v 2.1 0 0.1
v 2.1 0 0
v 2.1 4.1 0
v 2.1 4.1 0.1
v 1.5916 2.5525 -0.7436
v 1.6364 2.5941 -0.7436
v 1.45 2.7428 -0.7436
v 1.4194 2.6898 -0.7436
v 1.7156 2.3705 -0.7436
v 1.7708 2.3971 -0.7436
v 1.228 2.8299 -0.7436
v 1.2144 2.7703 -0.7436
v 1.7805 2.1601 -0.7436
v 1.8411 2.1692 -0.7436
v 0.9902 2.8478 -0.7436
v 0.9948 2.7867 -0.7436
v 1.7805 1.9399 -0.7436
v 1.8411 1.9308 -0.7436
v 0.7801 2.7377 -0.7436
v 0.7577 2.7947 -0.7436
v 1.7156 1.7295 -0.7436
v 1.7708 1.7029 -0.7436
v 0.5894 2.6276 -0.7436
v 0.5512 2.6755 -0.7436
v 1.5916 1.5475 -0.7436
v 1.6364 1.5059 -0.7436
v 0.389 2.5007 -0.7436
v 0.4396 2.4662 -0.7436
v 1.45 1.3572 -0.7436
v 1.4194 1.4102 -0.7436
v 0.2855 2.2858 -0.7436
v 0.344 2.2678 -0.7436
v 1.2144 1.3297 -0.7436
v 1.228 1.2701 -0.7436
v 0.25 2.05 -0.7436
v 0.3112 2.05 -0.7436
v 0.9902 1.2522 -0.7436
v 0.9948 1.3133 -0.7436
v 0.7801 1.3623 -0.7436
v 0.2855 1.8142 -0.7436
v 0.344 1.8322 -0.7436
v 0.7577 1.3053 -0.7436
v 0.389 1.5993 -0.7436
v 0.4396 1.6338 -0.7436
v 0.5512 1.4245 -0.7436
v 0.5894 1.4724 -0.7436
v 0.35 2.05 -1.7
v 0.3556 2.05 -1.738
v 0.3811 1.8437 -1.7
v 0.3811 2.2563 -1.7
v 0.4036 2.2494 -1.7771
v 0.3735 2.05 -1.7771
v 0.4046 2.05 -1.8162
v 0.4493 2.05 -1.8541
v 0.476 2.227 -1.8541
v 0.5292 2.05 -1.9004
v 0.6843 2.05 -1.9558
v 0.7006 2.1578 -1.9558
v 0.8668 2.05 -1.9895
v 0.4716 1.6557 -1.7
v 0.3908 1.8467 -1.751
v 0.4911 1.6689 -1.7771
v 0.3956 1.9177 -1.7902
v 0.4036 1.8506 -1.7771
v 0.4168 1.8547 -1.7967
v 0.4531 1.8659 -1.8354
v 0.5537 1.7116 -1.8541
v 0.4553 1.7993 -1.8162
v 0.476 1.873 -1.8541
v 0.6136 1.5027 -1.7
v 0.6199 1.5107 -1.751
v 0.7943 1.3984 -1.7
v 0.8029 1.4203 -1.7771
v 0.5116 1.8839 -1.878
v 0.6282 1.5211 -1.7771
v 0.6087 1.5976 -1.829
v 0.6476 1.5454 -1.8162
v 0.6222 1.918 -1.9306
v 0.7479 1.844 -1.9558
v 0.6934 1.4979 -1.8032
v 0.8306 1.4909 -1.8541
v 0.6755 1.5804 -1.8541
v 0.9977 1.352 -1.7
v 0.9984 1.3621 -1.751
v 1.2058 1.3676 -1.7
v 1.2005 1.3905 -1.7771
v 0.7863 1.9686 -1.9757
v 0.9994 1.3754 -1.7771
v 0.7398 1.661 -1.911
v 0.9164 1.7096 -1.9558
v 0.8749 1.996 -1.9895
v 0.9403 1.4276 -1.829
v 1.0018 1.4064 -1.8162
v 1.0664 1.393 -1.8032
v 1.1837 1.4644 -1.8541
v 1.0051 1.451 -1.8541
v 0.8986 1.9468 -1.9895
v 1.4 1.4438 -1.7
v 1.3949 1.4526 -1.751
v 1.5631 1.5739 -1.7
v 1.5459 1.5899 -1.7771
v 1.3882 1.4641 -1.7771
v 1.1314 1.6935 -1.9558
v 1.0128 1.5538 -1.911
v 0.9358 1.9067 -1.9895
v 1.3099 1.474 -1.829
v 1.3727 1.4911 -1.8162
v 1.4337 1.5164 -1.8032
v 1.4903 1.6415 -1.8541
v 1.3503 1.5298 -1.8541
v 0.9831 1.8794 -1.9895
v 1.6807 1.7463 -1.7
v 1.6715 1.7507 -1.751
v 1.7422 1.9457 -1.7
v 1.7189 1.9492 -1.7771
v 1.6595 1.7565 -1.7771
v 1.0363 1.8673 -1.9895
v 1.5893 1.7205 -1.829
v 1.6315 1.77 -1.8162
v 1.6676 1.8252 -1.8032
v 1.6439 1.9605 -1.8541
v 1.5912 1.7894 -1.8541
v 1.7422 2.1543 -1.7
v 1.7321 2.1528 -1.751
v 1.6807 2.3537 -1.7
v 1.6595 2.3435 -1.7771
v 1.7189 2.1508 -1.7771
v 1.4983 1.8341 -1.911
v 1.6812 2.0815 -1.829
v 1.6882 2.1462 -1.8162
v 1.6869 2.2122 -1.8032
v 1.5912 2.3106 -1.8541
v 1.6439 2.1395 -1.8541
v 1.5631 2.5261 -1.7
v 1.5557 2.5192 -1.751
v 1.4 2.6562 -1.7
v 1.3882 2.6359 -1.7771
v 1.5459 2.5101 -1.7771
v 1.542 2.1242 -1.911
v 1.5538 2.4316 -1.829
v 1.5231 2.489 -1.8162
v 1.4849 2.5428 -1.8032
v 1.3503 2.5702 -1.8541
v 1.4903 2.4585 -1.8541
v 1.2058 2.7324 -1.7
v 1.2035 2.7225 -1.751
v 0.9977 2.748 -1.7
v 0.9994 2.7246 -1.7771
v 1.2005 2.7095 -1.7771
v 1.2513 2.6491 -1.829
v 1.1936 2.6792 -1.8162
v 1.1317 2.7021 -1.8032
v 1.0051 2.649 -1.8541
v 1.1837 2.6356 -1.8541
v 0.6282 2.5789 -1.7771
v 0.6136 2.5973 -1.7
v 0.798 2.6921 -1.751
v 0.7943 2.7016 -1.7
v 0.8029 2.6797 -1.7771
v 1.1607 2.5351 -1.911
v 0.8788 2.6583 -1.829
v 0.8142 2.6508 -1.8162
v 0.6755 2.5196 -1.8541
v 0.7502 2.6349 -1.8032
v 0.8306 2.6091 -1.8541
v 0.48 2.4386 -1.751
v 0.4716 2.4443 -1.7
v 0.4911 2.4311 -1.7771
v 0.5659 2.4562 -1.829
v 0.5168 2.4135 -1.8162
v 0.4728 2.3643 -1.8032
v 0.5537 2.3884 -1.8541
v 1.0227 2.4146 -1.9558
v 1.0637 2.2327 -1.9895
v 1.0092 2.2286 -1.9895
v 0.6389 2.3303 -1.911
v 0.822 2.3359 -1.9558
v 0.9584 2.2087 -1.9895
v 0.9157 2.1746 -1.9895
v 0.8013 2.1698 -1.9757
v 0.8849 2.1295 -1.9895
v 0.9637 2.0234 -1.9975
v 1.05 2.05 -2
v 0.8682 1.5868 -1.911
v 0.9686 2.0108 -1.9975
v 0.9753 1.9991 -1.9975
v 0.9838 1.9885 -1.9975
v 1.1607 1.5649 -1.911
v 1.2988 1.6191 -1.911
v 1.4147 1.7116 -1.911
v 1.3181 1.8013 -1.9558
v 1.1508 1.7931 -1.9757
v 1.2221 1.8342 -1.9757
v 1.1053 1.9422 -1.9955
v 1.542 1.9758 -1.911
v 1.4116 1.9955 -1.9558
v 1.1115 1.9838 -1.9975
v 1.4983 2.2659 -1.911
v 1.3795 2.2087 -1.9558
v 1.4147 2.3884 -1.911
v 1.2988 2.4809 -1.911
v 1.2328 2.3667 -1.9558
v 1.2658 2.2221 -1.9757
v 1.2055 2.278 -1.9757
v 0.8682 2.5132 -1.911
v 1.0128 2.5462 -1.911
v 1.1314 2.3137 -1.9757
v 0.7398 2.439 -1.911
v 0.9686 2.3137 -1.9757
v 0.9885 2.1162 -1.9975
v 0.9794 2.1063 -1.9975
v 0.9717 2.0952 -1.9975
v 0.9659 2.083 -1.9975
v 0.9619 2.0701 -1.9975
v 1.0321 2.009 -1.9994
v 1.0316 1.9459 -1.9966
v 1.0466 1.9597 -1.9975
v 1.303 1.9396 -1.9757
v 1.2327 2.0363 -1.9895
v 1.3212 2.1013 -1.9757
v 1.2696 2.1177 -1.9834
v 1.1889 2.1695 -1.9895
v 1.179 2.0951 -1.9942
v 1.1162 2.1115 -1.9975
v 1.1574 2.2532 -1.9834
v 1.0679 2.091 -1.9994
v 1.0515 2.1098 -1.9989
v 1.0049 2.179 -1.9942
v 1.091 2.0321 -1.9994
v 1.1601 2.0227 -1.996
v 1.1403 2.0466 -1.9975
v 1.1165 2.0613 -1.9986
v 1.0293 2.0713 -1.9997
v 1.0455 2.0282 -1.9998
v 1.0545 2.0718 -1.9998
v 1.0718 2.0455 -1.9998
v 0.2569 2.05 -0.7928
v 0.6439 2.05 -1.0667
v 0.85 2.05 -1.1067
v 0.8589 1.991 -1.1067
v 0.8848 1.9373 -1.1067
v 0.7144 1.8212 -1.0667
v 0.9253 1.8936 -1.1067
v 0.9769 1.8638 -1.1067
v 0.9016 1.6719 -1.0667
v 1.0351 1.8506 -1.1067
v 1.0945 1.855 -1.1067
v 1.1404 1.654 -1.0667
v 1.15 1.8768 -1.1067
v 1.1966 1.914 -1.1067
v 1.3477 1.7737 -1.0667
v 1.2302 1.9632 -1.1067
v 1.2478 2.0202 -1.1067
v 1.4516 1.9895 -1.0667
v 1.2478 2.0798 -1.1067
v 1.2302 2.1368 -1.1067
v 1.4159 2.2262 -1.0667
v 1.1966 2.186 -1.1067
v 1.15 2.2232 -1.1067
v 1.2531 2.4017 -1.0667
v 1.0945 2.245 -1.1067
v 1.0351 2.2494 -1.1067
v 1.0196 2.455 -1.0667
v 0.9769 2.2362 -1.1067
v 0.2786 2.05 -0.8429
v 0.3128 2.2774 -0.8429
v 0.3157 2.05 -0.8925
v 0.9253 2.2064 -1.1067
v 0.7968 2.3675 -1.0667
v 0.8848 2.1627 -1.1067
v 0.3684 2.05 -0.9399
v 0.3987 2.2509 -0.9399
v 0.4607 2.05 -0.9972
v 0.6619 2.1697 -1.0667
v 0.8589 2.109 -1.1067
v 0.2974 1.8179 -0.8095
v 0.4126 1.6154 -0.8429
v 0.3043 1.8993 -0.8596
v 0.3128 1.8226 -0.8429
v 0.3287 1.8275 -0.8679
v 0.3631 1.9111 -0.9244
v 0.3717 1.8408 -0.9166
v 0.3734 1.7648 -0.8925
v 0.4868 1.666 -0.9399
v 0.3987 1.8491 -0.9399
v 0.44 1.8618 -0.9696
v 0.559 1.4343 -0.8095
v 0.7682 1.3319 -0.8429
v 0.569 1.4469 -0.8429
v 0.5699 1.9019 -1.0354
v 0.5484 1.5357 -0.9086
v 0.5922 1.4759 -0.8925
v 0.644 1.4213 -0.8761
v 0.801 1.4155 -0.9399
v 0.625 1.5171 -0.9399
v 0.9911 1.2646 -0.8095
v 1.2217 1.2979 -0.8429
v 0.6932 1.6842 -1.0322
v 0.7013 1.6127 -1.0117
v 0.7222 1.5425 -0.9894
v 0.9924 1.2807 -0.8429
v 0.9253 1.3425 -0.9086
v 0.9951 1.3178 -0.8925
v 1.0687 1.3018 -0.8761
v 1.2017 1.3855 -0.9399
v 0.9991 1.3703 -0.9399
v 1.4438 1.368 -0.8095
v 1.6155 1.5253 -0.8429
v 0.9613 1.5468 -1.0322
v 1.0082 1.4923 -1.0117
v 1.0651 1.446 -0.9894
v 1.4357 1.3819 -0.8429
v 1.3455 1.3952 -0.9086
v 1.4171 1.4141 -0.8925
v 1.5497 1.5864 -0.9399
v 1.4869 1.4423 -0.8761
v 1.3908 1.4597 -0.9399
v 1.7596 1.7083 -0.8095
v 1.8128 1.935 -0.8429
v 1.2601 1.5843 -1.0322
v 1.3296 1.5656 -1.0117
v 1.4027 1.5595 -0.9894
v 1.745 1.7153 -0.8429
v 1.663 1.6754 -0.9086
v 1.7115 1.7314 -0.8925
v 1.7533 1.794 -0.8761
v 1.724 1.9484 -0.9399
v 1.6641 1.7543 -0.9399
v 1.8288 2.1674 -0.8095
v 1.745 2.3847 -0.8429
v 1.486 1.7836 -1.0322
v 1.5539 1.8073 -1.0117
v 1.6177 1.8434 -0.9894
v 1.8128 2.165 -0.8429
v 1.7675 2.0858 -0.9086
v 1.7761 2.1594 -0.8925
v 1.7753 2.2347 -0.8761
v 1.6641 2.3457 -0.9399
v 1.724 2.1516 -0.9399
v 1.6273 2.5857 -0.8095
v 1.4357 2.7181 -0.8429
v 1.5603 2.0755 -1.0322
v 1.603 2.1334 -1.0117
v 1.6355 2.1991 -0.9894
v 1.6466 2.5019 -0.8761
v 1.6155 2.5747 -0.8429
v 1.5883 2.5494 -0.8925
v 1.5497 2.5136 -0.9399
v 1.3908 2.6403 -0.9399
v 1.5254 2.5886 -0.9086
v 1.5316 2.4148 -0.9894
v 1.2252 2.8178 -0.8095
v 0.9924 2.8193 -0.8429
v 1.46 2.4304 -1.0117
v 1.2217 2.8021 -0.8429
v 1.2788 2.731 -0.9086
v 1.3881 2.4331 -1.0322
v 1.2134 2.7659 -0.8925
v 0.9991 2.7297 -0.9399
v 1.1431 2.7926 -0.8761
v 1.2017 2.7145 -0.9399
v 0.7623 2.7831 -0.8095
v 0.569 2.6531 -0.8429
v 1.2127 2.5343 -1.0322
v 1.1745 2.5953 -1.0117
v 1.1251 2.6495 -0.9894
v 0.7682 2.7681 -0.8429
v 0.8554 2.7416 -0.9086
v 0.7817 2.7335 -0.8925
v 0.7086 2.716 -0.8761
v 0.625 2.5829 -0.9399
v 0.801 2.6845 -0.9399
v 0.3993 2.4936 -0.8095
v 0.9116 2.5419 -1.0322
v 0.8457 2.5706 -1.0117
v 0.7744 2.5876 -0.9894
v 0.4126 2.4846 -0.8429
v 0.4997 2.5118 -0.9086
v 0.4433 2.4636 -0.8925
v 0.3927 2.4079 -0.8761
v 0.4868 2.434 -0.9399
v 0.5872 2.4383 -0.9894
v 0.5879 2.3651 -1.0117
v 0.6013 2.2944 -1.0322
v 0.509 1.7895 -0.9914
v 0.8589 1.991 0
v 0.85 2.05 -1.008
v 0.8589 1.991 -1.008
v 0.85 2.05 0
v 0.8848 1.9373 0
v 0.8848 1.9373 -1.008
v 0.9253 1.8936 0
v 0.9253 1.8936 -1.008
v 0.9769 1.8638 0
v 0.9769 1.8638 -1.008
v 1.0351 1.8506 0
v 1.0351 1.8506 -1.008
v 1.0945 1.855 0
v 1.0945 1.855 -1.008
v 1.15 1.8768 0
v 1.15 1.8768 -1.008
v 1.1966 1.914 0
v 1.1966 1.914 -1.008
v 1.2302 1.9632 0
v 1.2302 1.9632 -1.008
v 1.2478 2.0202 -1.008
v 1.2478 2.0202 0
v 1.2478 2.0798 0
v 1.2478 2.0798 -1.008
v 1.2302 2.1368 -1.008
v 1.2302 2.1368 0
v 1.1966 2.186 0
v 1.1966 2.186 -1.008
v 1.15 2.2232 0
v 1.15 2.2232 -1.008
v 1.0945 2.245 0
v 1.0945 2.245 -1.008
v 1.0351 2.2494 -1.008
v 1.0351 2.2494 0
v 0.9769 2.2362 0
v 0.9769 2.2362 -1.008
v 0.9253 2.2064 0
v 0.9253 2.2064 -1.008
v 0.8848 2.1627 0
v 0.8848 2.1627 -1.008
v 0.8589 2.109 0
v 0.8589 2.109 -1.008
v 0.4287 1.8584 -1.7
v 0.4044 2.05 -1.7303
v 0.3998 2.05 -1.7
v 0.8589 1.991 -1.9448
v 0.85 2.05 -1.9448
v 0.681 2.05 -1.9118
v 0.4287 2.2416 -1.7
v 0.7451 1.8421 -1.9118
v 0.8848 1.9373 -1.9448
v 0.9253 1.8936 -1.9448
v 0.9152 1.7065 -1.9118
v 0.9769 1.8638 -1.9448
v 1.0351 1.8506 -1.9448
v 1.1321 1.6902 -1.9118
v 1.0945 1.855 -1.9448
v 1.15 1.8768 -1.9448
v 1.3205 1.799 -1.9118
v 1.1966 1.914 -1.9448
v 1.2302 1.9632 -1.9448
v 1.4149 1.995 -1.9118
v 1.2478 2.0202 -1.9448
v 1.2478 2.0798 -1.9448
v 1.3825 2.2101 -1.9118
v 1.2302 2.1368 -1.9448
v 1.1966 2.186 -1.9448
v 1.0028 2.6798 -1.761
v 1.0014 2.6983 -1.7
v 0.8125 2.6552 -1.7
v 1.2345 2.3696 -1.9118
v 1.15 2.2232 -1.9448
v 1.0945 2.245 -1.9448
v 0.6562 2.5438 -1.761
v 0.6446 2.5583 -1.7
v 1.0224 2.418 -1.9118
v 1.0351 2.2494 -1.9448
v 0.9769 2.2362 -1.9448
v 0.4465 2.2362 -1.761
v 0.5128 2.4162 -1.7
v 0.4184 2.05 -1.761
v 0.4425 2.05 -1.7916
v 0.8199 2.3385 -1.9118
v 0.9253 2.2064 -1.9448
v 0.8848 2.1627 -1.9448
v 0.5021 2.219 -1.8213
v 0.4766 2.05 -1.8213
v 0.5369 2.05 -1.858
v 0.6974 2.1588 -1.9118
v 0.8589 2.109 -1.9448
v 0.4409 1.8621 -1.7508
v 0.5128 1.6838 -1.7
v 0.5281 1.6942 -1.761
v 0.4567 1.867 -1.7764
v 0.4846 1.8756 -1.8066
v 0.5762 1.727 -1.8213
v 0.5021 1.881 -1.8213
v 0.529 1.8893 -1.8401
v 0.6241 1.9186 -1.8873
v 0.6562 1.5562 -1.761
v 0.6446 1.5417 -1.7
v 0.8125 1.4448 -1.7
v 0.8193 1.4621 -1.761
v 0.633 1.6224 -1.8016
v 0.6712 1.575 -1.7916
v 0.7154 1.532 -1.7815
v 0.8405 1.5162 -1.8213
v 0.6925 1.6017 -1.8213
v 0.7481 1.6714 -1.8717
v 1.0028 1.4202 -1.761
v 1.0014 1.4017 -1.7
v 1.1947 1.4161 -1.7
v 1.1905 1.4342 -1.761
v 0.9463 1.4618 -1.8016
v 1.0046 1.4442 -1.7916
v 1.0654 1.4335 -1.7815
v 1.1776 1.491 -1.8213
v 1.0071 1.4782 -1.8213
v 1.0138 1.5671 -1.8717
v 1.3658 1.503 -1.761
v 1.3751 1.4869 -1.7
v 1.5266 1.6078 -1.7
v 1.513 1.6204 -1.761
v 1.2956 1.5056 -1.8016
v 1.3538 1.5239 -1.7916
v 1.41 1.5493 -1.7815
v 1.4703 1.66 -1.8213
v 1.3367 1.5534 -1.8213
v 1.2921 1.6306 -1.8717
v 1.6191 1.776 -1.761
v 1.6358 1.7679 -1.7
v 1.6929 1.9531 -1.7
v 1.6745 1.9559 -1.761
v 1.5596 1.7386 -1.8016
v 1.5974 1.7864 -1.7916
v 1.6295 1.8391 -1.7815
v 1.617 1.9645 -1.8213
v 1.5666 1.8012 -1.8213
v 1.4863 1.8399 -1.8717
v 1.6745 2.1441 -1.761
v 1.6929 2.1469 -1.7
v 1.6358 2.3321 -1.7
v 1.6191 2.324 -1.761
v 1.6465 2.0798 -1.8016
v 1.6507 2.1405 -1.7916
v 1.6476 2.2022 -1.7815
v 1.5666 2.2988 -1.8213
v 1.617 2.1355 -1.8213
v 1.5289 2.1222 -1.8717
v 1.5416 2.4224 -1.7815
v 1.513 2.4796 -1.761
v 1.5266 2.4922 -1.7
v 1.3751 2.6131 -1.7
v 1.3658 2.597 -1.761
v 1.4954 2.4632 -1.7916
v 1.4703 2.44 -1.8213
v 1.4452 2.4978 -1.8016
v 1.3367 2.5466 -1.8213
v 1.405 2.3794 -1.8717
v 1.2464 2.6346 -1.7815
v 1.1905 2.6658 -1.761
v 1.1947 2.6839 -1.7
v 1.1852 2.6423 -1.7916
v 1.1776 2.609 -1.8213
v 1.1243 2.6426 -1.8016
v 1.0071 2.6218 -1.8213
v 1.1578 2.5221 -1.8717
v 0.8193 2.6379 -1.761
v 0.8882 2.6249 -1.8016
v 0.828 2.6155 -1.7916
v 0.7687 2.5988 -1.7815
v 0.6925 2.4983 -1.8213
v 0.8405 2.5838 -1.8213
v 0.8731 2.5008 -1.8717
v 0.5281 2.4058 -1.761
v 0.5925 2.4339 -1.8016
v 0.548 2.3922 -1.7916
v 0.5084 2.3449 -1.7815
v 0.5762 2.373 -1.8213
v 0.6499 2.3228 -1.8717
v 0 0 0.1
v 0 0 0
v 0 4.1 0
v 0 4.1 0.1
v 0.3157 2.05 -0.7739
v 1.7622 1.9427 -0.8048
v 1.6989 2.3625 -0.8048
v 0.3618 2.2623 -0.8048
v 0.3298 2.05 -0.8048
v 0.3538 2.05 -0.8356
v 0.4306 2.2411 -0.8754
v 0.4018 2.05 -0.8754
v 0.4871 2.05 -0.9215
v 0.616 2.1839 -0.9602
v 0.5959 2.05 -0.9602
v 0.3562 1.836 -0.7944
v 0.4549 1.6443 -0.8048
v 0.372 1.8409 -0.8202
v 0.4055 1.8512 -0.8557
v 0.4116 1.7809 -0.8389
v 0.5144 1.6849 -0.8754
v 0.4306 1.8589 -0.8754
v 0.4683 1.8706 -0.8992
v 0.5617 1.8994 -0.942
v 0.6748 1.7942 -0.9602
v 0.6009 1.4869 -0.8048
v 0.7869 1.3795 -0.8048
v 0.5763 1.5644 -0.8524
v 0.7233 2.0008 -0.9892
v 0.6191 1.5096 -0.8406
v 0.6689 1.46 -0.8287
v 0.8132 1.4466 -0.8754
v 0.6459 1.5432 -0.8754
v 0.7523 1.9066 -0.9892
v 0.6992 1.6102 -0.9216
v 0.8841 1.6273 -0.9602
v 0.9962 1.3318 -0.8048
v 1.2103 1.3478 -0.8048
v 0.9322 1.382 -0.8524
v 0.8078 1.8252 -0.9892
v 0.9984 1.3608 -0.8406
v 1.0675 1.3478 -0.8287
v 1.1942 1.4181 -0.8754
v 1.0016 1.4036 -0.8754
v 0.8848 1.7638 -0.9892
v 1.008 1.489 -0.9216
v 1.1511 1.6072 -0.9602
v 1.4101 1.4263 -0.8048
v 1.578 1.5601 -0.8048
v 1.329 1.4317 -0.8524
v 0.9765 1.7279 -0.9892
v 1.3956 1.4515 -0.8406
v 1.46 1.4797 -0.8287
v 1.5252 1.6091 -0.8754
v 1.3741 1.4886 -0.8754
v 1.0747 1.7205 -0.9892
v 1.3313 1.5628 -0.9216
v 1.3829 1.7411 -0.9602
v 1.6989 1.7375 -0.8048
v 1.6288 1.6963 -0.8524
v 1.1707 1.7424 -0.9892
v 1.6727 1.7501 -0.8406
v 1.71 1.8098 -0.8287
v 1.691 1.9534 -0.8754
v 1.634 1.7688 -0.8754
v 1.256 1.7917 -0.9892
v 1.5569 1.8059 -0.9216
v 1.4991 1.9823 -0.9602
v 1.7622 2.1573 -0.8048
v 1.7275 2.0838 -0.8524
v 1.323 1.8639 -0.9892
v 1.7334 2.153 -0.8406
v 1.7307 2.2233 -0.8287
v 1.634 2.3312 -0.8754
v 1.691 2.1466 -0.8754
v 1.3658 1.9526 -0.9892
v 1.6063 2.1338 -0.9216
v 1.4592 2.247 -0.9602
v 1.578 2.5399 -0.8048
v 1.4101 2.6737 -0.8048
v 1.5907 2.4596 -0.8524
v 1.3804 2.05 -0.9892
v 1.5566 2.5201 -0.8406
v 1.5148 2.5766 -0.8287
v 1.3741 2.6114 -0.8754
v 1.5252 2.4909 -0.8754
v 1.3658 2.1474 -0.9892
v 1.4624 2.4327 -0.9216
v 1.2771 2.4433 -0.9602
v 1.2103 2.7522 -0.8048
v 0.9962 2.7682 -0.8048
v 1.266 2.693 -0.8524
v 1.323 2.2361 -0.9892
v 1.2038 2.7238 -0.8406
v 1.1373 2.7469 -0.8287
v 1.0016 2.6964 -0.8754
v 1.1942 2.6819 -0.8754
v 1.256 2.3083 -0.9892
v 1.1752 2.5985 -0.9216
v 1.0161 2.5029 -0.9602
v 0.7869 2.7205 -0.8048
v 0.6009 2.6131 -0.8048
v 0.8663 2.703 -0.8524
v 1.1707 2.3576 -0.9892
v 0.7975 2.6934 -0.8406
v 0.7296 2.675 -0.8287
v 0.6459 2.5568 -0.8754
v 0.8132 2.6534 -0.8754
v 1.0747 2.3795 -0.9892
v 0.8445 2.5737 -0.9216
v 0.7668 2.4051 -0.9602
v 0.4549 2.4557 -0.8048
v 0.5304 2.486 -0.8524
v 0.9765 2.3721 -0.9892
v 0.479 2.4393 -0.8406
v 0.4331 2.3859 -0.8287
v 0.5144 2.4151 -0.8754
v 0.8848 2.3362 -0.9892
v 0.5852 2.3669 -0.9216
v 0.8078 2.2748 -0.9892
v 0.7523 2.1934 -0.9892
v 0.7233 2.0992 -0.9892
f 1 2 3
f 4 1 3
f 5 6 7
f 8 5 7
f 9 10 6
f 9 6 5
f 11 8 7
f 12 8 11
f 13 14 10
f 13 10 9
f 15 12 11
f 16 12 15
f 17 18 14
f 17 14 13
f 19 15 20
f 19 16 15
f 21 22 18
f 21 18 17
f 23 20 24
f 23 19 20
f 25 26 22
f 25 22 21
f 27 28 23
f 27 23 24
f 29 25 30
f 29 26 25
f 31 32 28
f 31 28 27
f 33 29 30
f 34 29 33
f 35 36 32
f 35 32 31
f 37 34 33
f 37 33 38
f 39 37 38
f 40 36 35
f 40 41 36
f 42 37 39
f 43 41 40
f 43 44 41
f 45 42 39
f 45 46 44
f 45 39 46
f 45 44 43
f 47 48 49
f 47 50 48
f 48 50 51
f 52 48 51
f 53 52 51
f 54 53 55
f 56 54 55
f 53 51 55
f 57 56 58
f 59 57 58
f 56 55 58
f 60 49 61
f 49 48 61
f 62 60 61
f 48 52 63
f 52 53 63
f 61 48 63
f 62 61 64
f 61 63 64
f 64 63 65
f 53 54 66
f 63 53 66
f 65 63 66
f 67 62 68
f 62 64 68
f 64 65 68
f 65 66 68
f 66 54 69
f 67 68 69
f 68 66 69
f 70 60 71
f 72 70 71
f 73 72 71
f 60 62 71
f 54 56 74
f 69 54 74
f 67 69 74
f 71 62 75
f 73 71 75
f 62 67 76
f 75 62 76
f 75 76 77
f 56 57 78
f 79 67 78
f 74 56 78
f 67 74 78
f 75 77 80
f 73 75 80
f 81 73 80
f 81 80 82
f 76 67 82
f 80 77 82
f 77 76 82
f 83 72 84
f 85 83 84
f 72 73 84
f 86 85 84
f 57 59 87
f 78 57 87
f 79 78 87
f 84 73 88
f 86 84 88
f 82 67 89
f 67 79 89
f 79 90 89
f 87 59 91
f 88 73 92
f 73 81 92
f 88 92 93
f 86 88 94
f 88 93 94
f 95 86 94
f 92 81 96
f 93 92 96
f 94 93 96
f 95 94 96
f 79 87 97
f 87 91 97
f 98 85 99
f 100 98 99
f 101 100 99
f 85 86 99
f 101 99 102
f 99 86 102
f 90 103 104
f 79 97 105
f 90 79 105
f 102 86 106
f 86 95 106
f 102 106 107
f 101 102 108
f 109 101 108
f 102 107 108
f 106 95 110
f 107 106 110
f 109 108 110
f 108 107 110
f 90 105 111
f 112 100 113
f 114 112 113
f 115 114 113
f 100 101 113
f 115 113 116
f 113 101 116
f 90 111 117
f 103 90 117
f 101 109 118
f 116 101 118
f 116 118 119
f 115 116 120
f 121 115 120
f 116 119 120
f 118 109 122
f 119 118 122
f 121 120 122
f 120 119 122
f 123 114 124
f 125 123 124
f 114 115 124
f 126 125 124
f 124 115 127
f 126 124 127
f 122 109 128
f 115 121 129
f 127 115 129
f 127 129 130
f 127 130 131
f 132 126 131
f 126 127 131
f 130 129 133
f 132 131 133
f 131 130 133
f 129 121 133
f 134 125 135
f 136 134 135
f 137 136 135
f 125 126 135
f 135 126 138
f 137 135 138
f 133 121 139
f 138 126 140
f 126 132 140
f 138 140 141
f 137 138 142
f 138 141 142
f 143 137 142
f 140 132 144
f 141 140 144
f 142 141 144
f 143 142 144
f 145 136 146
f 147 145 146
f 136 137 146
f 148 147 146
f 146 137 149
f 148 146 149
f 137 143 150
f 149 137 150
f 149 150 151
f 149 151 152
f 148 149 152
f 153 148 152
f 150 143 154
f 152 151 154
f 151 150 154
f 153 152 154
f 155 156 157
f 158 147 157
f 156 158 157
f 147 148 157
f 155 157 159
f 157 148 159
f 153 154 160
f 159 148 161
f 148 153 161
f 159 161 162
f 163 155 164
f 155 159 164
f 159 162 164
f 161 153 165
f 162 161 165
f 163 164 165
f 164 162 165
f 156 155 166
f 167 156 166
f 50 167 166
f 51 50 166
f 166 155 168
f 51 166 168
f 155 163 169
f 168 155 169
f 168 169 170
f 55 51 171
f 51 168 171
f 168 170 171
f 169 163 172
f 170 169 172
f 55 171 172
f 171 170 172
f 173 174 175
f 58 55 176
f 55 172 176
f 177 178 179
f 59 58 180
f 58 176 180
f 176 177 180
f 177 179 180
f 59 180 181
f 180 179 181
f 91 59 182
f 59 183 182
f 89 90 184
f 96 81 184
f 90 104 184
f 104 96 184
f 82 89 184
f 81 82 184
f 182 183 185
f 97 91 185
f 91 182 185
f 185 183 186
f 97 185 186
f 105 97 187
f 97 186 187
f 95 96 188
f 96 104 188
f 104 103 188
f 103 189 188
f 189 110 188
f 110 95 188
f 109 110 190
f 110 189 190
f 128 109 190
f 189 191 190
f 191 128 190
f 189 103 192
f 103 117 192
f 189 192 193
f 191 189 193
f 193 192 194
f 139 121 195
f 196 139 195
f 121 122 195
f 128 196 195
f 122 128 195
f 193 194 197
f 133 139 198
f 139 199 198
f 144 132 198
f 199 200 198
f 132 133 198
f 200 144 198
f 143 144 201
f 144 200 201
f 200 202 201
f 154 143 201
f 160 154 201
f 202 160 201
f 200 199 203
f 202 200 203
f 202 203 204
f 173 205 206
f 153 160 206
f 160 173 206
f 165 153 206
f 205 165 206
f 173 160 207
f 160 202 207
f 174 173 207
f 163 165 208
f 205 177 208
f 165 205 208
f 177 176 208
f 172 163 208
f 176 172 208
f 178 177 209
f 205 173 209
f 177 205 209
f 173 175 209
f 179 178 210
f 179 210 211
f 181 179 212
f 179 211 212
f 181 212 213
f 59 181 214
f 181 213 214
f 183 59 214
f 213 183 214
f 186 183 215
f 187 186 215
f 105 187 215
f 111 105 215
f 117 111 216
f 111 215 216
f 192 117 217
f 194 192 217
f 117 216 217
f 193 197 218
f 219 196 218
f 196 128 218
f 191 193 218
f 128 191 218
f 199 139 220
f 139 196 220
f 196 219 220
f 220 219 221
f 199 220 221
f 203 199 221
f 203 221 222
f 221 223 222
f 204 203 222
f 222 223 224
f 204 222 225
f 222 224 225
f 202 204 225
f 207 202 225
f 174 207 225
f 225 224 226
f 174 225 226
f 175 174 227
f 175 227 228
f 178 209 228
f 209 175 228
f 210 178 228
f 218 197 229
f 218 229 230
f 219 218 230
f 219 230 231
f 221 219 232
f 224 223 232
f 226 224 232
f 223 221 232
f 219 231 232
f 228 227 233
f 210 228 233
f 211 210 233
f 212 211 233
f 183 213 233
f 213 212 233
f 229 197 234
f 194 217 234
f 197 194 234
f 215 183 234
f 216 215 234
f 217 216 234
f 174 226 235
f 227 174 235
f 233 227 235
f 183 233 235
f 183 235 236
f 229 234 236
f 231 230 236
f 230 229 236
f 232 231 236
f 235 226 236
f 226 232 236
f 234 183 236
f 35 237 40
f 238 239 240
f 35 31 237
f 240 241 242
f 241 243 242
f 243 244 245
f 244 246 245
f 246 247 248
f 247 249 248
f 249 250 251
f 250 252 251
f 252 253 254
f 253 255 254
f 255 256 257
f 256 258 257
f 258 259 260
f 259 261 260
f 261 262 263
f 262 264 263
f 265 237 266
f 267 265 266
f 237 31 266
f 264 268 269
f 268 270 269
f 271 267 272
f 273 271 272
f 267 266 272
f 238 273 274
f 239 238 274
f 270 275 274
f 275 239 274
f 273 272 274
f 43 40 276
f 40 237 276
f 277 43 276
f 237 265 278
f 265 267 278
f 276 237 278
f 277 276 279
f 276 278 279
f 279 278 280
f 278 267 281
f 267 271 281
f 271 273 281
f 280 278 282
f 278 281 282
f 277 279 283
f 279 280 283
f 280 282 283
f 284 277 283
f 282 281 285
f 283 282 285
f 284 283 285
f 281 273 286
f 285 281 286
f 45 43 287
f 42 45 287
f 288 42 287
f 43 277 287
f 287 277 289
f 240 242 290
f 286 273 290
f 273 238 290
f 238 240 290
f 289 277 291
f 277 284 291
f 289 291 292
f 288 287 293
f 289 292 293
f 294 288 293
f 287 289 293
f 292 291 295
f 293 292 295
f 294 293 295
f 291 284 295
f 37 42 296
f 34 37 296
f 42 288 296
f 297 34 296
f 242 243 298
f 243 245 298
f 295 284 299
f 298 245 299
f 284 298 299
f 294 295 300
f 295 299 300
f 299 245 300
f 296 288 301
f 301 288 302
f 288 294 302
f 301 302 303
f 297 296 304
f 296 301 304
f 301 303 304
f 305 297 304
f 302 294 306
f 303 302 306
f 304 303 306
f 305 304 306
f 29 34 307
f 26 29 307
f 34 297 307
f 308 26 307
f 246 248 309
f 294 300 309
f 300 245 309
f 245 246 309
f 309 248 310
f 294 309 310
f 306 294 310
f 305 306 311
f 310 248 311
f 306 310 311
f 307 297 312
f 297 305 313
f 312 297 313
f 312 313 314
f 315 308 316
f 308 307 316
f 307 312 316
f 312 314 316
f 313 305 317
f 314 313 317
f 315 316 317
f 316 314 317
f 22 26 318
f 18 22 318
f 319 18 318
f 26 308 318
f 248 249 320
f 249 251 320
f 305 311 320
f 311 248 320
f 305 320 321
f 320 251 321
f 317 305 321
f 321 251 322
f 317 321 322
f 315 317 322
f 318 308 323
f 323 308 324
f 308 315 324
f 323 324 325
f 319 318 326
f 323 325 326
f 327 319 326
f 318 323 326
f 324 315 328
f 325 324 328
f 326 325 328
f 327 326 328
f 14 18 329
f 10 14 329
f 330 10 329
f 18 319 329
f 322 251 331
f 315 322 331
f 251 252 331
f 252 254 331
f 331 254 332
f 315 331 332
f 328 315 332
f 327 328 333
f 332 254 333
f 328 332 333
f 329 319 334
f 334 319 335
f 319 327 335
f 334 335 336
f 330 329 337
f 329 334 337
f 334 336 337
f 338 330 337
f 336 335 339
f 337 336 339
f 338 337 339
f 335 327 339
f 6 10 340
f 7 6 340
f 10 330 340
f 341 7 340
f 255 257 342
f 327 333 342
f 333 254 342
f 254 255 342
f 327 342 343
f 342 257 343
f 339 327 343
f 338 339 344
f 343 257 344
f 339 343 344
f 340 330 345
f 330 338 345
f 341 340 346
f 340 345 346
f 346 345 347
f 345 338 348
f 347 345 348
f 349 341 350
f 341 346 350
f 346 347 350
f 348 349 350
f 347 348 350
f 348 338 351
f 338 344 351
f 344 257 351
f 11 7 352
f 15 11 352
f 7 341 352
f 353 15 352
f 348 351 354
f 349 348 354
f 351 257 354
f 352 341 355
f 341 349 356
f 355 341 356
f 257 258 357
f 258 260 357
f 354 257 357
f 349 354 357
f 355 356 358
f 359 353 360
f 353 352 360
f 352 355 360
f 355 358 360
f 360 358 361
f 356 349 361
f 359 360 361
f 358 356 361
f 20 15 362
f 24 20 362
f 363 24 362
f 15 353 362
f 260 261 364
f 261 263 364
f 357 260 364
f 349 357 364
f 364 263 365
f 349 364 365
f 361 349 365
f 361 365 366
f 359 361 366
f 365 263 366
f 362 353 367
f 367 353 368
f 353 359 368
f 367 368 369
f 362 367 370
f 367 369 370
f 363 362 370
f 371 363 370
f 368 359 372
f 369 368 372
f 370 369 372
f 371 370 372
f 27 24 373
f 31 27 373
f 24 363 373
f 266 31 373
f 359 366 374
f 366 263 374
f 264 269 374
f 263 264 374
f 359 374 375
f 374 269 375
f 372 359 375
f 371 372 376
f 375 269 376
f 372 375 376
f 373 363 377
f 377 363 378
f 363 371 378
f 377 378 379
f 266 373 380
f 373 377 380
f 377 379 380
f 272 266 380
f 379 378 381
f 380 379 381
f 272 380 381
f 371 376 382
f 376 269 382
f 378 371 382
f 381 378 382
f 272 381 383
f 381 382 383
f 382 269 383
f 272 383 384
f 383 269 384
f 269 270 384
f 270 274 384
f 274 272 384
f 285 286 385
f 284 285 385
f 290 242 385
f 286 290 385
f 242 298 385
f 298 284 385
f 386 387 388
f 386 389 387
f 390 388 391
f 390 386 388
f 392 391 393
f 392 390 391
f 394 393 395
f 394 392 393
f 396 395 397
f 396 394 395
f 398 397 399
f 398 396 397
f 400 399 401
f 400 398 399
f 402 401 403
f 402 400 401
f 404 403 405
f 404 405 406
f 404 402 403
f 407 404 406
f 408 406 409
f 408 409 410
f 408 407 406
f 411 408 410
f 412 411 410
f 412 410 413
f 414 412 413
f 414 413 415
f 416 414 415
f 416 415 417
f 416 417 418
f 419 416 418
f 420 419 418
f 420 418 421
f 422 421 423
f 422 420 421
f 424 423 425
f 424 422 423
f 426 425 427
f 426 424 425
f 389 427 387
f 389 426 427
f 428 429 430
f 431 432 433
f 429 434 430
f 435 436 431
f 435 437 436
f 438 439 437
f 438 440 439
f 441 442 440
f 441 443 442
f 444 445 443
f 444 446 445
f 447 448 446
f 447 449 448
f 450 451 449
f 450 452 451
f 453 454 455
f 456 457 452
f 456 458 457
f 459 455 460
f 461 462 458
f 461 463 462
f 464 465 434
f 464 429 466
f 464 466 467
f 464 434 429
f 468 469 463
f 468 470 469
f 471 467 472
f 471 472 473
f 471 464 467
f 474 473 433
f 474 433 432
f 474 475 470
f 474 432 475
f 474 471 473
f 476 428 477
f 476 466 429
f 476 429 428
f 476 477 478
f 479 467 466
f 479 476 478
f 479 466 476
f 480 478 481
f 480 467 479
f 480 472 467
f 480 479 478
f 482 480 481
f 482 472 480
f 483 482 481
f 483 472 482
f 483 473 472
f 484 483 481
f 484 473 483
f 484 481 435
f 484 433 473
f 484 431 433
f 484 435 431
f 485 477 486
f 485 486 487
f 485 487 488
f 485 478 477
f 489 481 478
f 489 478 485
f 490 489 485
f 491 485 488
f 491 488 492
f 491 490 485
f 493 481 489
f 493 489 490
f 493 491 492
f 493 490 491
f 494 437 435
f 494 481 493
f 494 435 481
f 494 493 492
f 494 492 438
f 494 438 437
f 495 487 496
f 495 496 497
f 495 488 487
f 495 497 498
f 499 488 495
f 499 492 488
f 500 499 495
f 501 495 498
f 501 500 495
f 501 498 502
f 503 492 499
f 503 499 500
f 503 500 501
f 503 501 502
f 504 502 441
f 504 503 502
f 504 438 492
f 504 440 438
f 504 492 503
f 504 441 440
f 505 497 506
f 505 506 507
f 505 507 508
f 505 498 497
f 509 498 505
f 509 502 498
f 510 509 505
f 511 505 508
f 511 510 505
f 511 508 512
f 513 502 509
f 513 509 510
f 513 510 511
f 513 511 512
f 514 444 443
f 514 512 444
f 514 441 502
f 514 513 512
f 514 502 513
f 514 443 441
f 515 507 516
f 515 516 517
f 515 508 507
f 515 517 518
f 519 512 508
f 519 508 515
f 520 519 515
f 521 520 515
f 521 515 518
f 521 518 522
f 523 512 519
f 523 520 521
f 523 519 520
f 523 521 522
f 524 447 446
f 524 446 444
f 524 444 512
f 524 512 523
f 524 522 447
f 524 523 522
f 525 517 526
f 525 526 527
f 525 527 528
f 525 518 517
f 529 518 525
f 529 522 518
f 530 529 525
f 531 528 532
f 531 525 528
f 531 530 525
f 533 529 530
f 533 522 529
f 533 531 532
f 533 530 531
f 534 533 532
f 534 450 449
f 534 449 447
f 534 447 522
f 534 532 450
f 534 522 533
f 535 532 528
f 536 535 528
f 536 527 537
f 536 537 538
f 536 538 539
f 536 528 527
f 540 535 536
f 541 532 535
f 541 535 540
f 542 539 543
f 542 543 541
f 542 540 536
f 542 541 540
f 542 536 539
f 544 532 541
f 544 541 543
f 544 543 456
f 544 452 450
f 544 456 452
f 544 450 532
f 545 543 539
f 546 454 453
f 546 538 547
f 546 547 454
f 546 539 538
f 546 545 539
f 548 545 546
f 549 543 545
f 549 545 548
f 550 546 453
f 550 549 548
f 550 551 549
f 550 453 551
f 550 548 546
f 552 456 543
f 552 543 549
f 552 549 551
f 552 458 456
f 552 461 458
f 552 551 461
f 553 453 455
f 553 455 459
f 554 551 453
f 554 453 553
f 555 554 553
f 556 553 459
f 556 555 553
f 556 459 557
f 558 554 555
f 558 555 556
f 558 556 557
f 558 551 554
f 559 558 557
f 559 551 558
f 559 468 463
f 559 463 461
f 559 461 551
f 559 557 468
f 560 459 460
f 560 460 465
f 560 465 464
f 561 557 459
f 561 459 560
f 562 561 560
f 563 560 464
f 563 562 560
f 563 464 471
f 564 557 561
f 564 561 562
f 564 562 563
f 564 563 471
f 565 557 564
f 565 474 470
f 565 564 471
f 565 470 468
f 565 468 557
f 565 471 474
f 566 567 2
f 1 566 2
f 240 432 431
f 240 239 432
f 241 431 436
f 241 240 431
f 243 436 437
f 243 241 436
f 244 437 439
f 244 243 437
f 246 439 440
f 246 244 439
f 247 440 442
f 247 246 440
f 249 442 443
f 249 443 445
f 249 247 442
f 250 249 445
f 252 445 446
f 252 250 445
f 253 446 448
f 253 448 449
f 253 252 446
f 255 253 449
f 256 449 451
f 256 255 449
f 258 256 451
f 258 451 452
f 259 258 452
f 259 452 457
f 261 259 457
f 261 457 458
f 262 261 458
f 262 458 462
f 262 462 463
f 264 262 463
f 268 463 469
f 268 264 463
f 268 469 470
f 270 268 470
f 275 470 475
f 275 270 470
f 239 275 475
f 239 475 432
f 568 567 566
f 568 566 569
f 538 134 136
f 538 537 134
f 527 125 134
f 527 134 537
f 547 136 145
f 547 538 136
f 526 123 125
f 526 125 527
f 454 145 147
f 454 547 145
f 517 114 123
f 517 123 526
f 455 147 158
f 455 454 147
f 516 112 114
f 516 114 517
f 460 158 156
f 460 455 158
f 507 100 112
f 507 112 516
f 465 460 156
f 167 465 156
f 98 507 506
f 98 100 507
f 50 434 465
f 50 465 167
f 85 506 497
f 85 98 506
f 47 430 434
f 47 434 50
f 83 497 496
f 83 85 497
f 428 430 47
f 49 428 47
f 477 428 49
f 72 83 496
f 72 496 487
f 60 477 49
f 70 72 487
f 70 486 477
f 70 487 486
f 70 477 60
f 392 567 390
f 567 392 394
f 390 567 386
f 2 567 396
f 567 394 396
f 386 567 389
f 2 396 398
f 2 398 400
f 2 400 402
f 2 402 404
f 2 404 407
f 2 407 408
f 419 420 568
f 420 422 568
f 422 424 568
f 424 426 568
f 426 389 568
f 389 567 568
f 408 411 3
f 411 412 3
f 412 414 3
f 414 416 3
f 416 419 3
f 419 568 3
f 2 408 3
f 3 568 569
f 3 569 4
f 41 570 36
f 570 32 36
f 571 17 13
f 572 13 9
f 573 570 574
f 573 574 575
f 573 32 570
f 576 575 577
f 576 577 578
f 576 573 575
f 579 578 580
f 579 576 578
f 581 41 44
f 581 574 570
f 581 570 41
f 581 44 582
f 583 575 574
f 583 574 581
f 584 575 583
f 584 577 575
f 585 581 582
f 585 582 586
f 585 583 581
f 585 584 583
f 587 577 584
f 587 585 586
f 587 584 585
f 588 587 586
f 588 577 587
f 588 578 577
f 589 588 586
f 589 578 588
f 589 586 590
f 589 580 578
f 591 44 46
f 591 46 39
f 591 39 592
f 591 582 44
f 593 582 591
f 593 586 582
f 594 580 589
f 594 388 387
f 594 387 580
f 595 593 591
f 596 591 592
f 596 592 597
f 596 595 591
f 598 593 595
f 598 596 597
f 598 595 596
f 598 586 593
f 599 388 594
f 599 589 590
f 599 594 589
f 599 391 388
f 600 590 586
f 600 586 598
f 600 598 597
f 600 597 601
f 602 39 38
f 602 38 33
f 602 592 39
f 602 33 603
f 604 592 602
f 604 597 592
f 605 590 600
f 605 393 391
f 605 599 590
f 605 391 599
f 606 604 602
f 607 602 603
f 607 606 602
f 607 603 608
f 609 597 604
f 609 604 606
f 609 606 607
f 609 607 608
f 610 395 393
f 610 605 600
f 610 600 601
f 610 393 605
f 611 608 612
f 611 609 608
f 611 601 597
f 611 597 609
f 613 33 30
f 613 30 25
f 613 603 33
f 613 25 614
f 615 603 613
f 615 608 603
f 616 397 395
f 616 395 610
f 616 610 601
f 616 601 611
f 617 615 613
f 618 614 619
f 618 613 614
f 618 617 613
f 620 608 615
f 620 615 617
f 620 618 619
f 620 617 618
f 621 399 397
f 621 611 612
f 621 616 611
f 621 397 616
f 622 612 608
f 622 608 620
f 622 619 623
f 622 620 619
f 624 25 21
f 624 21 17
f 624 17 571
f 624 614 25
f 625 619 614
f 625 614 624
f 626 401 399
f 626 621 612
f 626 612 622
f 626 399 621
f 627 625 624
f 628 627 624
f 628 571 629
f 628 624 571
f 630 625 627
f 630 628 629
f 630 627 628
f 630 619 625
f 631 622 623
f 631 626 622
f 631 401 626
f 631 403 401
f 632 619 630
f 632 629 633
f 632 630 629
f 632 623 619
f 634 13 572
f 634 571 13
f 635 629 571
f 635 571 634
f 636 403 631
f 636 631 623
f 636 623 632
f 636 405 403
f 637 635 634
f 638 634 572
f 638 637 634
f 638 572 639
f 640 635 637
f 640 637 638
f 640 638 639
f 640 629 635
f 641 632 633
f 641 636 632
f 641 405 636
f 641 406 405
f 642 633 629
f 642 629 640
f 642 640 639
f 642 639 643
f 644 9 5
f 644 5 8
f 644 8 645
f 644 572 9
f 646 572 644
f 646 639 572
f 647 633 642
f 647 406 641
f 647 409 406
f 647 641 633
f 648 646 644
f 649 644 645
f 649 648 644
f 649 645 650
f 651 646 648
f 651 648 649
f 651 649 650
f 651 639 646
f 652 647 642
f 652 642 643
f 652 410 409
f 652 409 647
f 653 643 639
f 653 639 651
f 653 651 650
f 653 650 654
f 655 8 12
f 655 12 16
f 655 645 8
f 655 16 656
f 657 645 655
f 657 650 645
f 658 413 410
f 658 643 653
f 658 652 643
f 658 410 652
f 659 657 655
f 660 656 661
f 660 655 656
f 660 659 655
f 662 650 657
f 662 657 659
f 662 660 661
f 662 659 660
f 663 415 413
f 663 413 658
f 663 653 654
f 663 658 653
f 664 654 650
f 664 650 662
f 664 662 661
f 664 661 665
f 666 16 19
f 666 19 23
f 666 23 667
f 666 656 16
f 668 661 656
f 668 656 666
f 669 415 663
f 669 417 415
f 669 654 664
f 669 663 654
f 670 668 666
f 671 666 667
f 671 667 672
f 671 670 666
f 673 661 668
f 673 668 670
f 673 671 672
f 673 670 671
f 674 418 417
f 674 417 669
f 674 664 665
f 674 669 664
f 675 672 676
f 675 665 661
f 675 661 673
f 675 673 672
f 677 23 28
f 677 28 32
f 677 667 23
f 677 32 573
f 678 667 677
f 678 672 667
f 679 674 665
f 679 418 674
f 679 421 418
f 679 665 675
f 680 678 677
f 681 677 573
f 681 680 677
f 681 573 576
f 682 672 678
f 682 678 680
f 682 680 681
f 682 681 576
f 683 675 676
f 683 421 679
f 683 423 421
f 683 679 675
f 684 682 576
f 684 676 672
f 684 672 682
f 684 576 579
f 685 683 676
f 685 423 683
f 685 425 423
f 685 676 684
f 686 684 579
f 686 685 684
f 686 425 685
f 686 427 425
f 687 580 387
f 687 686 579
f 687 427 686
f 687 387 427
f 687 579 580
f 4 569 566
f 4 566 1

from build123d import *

# Parameters (mm, degrees)
ESQUISSE1_W        = 2.1
ESQUISSE1_H        = 4.1
BOSS_EXTRU_1_DEPTH = 0.1


with BuildPart() as part:
    # Esquisse1 → Boss.-Extru.1 (new body)
    with BuildSketch(Plane.XY):
        with Locations((1.05, 2.05)):
            Rectangle(ESQUISSE1_W, ESQUISSE1_H)
    extrude(amount=BOSS_EXTRU_1_DEPTH)

    # Esquisse7 → Révolution1 (revolve)
    with BuildSketch(Plane(origin=(0, 2.05, 0), x_dir=(1, 0, 0), z_dir=(0, 1, 0)), mode=Mode.PRIVATE) as r_volution1_sk:
        with BuildLine():
            Line((1.25, 0.395972745), (1.25, 0))
            Line((1.25, 0), (1.05, 0))
            Line((1.05, 0), (1.05, 2))
            add(Edge.make_bspline(
                [(1.75, 1.7), (1.75, 2), (1.05, 2)],
                knots=[0, 0, 0, 1.570796327, 1.570796327, 1.570796327], degree=2, weights=[1, 0.707106781, 1]))
            Line((1.75, 1.7), (1.700157336, 1.7))
            add(Edge.make_bspline(
                [(1.700157336, 1.7), (1.700157336, 1.887217668), (1.25, 1.944809164)],
                knots=[0, 0, 0, 1.258107861, 1.258107861, 1.258107861], degree=2, weights=[1, 0.808584519, 1]))
            Line((1.25, 1.944809164), (1.25, 1.402758989))
            Line((1.25, 1.402758989), (1.25, 1.106699238))
            add(Edge.make_bspline(
                [(1.85, 0.743607049), (1.85, 1.0340808), (1.25, 1.106699238)],
                knots=[0, 0, 0, 1.318116072, 1.318116072, 1.318116072], degree=2, weights=[1, 0.790569415, 1]))
            Line((1.85, 0.743607049), (1.788788917, 0.743607049))
            add(Edge.make_bspline(
                [(1.788788917, 0.743607049), (1.788788917, 0.951664265), (1.25, 1.007988124)],
                knots=[0, 0, 0, 1.296662385, 1.296662385, 1.296662385], degree=2, weights=[1, 0.797092629, 1]))
            Line((1.25, 1.007988124), (1.25, 0.395972745))
        make_face()
    revolve(r_volution1_sk.sketch.rotate(Axis((1.05, 2.05, -2), (0, 0, 1)), 180), axis=Axis((1.05, 2.05, -2), (0, 0, 1)))


solid = part.part
